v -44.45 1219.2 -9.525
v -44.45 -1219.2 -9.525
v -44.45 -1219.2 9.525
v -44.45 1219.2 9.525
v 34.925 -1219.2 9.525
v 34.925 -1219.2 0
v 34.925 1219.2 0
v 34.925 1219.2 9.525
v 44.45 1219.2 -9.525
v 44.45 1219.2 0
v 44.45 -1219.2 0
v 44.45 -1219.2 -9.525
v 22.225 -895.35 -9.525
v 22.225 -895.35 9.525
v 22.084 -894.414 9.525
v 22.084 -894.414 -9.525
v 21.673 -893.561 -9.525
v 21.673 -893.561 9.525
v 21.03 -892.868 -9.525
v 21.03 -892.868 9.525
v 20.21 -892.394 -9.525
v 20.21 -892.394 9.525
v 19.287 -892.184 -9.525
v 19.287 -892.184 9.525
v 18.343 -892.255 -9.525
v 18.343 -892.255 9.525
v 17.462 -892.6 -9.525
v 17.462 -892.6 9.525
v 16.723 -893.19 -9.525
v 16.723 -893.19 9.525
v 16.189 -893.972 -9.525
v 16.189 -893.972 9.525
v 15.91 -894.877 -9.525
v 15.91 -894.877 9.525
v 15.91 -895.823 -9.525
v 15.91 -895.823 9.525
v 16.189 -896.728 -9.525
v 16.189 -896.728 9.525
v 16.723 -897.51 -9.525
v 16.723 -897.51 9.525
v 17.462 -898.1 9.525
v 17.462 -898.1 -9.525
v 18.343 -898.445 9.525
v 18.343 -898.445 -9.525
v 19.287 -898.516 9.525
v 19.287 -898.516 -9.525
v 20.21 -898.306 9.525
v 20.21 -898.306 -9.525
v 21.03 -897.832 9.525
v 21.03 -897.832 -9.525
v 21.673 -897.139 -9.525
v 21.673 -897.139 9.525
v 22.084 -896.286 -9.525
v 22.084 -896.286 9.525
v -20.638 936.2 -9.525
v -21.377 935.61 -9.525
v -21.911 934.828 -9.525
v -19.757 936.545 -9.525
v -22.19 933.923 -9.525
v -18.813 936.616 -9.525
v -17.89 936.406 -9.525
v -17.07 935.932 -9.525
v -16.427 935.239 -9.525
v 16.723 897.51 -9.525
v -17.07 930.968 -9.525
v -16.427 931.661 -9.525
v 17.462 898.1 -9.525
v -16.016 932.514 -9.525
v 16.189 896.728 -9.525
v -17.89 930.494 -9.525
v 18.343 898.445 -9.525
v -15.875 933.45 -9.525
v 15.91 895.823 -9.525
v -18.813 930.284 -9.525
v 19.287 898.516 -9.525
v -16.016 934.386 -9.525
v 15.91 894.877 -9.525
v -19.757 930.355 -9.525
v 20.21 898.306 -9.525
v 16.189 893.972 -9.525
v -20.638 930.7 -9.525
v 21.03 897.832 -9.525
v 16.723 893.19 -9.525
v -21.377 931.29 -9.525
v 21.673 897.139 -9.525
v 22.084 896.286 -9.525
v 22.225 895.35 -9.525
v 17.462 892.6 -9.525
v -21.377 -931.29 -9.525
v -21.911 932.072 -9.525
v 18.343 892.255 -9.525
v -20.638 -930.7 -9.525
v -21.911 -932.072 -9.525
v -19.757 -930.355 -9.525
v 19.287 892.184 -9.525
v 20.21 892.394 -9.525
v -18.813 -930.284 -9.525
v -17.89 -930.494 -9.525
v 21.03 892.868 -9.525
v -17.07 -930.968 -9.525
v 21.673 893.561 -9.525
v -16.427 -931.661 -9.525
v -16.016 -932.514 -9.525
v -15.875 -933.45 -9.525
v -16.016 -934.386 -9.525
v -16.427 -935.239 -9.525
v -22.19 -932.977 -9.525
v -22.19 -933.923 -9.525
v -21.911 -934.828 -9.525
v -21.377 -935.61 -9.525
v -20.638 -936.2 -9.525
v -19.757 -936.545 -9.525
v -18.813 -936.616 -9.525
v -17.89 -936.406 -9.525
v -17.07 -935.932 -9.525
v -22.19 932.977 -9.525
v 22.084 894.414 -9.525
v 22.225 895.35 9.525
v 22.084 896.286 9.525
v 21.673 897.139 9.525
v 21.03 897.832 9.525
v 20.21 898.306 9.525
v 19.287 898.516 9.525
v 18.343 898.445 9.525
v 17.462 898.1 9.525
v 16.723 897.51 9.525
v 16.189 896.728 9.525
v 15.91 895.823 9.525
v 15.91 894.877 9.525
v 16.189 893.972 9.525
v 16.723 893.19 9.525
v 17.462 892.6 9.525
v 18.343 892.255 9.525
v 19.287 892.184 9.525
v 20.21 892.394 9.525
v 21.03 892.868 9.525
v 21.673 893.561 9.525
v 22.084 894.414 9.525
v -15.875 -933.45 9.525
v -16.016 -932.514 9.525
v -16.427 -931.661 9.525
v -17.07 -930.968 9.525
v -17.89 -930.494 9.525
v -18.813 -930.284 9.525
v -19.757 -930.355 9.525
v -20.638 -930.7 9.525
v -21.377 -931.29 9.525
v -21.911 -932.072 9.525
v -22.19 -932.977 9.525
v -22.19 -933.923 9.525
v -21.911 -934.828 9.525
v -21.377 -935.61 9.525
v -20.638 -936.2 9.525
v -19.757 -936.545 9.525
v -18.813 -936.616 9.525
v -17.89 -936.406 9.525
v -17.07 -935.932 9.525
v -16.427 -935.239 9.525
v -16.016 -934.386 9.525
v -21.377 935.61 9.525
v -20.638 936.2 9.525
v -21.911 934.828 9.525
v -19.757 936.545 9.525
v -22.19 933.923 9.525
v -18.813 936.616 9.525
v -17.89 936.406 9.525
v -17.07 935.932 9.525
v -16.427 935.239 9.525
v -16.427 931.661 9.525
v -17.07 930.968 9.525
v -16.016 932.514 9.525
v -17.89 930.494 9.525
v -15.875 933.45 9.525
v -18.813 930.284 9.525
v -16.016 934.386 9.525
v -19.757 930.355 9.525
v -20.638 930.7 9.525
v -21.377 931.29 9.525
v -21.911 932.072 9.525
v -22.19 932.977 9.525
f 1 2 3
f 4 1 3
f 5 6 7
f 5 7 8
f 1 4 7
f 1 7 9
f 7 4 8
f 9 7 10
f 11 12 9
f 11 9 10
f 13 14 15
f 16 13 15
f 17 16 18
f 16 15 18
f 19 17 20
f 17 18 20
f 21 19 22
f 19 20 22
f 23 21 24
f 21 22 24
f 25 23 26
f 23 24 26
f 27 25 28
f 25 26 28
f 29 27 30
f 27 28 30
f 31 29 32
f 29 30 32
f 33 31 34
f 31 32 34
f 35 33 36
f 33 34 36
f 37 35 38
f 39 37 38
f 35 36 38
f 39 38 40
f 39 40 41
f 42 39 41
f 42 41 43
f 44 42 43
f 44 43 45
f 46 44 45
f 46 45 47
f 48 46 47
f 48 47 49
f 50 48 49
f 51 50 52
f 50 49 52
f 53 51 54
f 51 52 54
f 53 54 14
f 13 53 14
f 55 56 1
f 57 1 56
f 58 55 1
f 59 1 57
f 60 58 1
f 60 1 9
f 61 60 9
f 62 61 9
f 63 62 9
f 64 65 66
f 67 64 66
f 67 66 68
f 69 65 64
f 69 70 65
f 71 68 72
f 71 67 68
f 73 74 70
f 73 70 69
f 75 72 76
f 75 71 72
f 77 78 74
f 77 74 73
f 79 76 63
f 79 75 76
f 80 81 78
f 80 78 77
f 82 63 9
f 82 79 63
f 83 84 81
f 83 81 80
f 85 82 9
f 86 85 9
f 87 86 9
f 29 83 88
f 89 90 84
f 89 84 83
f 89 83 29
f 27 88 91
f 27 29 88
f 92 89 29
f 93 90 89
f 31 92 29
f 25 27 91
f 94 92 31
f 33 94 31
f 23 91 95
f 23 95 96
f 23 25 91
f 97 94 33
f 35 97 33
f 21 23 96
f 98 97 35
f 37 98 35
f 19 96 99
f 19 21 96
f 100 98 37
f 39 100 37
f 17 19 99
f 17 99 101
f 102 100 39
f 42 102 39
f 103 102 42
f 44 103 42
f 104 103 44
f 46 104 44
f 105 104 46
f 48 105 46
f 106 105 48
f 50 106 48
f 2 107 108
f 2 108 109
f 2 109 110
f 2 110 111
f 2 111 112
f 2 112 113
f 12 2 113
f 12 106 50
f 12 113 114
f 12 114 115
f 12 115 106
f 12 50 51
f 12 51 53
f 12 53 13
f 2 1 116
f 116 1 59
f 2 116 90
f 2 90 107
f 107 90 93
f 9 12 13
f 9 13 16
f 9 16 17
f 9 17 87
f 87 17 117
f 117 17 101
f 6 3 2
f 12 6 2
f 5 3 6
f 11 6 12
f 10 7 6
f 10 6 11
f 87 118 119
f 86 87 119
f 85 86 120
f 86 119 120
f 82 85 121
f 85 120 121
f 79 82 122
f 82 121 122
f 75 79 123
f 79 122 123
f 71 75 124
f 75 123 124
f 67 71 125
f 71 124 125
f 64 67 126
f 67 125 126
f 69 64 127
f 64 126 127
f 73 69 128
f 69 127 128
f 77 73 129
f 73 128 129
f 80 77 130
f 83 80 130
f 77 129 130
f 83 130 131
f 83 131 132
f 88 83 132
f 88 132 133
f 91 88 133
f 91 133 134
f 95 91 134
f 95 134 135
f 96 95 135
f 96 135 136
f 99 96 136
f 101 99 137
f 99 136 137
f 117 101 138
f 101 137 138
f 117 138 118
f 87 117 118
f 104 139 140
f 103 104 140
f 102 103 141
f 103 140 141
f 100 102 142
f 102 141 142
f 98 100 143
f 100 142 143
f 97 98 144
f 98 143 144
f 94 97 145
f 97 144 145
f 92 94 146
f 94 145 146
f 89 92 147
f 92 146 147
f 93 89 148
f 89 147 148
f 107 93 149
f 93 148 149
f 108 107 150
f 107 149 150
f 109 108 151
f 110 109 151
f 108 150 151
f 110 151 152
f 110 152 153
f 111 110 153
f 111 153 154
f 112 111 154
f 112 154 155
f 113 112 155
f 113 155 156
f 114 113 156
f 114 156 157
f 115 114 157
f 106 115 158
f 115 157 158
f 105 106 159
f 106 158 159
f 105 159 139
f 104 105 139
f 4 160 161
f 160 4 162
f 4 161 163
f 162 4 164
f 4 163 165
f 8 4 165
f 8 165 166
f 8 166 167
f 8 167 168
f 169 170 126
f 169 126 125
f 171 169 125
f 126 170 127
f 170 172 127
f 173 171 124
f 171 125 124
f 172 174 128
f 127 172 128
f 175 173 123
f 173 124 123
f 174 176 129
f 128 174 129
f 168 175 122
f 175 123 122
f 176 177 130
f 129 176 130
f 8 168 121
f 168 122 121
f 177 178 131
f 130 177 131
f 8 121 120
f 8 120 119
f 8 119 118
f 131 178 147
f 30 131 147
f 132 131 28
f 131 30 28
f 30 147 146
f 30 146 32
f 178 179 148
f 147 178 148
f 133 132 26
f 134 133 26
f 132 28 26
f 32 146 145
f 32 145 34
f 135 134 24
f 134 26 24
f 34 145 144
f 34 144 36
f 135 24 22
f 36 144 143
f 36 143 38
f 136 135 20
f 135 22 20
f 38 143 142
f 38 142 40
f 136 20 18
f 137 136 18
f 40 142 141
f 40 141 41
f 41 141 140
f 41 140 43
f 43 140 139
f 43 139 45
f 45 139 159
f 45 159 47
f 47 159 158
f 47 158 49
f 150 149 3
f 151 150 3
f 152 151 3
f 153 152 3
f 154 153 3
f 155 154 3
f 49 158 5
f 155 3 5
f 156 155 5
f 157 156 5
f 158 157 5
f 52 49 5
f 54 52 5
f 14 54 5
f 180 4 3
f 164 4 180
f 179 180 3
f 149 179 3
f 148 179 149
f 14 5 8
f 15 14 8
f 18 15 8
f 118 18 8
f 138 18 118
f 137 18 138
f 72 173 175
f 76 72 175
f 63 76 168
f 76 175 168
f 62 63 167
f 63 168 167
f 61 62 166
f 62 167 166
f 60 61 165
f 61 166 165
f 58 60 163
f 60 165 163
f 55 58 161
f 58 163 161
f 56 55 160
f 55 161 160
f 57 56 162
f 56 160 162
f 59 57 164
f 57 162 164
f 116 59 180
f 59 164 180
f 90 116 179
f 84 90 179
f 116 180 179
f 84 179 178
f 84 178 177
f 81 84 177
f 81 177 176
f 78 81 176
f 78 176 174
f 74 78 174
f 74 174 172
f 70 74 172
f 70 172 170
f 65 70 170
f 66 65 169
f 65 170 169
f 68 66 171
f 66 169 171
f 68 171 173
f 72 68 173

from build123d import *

# Parameters (mm, degrees)
F0_W     = 88.9
F0_H     = 19.05
F1_DEPTH = 1219.2
F2_W     = 44.1598849037
F2_H     = 21.9993637201
F3_DEPTH = 2438.401
F5_R     = 3.175
F6_DEPTH = 19.05


with BuildPart() as f1:
    # F0 (on Front) → F1 (new body, symmetric)
    with BuildSketch(Plane.XZ):
        Rectangle(F0_W, F0_H)
    extrude(amount=F1_DEPTH, both=True)

    # F2 (on face) → F3 (cut, through all)
    with BuildSketch(Plane.XZ.offset(1219.2)):
        with Locations((57.0049424518, 10.9996818601)):
            Rectangle(F2_W, F2_H)
    extrude(amount=-F3_DEPTH, mode=Mode.SUBTRACT)

    # F5 (on face) → F6 (cut, through all)
    with BuildSketch(Plane.XY.offset(9.525)):
        with Locations((19.05, -895.35)):
            Circle(F5_R)
        with Locations((-19.05, -933.45)):
            Circle(F5_R)
        with Locations((-19.05, 933.45)):
            Circle(F5_R)
        with Locations((19.05, 895.35)):
            Circle(F5_R)
    extrude(amount=-F6_DEPTH, mode=Mode.SUBTRACT)


solid = f1.part
